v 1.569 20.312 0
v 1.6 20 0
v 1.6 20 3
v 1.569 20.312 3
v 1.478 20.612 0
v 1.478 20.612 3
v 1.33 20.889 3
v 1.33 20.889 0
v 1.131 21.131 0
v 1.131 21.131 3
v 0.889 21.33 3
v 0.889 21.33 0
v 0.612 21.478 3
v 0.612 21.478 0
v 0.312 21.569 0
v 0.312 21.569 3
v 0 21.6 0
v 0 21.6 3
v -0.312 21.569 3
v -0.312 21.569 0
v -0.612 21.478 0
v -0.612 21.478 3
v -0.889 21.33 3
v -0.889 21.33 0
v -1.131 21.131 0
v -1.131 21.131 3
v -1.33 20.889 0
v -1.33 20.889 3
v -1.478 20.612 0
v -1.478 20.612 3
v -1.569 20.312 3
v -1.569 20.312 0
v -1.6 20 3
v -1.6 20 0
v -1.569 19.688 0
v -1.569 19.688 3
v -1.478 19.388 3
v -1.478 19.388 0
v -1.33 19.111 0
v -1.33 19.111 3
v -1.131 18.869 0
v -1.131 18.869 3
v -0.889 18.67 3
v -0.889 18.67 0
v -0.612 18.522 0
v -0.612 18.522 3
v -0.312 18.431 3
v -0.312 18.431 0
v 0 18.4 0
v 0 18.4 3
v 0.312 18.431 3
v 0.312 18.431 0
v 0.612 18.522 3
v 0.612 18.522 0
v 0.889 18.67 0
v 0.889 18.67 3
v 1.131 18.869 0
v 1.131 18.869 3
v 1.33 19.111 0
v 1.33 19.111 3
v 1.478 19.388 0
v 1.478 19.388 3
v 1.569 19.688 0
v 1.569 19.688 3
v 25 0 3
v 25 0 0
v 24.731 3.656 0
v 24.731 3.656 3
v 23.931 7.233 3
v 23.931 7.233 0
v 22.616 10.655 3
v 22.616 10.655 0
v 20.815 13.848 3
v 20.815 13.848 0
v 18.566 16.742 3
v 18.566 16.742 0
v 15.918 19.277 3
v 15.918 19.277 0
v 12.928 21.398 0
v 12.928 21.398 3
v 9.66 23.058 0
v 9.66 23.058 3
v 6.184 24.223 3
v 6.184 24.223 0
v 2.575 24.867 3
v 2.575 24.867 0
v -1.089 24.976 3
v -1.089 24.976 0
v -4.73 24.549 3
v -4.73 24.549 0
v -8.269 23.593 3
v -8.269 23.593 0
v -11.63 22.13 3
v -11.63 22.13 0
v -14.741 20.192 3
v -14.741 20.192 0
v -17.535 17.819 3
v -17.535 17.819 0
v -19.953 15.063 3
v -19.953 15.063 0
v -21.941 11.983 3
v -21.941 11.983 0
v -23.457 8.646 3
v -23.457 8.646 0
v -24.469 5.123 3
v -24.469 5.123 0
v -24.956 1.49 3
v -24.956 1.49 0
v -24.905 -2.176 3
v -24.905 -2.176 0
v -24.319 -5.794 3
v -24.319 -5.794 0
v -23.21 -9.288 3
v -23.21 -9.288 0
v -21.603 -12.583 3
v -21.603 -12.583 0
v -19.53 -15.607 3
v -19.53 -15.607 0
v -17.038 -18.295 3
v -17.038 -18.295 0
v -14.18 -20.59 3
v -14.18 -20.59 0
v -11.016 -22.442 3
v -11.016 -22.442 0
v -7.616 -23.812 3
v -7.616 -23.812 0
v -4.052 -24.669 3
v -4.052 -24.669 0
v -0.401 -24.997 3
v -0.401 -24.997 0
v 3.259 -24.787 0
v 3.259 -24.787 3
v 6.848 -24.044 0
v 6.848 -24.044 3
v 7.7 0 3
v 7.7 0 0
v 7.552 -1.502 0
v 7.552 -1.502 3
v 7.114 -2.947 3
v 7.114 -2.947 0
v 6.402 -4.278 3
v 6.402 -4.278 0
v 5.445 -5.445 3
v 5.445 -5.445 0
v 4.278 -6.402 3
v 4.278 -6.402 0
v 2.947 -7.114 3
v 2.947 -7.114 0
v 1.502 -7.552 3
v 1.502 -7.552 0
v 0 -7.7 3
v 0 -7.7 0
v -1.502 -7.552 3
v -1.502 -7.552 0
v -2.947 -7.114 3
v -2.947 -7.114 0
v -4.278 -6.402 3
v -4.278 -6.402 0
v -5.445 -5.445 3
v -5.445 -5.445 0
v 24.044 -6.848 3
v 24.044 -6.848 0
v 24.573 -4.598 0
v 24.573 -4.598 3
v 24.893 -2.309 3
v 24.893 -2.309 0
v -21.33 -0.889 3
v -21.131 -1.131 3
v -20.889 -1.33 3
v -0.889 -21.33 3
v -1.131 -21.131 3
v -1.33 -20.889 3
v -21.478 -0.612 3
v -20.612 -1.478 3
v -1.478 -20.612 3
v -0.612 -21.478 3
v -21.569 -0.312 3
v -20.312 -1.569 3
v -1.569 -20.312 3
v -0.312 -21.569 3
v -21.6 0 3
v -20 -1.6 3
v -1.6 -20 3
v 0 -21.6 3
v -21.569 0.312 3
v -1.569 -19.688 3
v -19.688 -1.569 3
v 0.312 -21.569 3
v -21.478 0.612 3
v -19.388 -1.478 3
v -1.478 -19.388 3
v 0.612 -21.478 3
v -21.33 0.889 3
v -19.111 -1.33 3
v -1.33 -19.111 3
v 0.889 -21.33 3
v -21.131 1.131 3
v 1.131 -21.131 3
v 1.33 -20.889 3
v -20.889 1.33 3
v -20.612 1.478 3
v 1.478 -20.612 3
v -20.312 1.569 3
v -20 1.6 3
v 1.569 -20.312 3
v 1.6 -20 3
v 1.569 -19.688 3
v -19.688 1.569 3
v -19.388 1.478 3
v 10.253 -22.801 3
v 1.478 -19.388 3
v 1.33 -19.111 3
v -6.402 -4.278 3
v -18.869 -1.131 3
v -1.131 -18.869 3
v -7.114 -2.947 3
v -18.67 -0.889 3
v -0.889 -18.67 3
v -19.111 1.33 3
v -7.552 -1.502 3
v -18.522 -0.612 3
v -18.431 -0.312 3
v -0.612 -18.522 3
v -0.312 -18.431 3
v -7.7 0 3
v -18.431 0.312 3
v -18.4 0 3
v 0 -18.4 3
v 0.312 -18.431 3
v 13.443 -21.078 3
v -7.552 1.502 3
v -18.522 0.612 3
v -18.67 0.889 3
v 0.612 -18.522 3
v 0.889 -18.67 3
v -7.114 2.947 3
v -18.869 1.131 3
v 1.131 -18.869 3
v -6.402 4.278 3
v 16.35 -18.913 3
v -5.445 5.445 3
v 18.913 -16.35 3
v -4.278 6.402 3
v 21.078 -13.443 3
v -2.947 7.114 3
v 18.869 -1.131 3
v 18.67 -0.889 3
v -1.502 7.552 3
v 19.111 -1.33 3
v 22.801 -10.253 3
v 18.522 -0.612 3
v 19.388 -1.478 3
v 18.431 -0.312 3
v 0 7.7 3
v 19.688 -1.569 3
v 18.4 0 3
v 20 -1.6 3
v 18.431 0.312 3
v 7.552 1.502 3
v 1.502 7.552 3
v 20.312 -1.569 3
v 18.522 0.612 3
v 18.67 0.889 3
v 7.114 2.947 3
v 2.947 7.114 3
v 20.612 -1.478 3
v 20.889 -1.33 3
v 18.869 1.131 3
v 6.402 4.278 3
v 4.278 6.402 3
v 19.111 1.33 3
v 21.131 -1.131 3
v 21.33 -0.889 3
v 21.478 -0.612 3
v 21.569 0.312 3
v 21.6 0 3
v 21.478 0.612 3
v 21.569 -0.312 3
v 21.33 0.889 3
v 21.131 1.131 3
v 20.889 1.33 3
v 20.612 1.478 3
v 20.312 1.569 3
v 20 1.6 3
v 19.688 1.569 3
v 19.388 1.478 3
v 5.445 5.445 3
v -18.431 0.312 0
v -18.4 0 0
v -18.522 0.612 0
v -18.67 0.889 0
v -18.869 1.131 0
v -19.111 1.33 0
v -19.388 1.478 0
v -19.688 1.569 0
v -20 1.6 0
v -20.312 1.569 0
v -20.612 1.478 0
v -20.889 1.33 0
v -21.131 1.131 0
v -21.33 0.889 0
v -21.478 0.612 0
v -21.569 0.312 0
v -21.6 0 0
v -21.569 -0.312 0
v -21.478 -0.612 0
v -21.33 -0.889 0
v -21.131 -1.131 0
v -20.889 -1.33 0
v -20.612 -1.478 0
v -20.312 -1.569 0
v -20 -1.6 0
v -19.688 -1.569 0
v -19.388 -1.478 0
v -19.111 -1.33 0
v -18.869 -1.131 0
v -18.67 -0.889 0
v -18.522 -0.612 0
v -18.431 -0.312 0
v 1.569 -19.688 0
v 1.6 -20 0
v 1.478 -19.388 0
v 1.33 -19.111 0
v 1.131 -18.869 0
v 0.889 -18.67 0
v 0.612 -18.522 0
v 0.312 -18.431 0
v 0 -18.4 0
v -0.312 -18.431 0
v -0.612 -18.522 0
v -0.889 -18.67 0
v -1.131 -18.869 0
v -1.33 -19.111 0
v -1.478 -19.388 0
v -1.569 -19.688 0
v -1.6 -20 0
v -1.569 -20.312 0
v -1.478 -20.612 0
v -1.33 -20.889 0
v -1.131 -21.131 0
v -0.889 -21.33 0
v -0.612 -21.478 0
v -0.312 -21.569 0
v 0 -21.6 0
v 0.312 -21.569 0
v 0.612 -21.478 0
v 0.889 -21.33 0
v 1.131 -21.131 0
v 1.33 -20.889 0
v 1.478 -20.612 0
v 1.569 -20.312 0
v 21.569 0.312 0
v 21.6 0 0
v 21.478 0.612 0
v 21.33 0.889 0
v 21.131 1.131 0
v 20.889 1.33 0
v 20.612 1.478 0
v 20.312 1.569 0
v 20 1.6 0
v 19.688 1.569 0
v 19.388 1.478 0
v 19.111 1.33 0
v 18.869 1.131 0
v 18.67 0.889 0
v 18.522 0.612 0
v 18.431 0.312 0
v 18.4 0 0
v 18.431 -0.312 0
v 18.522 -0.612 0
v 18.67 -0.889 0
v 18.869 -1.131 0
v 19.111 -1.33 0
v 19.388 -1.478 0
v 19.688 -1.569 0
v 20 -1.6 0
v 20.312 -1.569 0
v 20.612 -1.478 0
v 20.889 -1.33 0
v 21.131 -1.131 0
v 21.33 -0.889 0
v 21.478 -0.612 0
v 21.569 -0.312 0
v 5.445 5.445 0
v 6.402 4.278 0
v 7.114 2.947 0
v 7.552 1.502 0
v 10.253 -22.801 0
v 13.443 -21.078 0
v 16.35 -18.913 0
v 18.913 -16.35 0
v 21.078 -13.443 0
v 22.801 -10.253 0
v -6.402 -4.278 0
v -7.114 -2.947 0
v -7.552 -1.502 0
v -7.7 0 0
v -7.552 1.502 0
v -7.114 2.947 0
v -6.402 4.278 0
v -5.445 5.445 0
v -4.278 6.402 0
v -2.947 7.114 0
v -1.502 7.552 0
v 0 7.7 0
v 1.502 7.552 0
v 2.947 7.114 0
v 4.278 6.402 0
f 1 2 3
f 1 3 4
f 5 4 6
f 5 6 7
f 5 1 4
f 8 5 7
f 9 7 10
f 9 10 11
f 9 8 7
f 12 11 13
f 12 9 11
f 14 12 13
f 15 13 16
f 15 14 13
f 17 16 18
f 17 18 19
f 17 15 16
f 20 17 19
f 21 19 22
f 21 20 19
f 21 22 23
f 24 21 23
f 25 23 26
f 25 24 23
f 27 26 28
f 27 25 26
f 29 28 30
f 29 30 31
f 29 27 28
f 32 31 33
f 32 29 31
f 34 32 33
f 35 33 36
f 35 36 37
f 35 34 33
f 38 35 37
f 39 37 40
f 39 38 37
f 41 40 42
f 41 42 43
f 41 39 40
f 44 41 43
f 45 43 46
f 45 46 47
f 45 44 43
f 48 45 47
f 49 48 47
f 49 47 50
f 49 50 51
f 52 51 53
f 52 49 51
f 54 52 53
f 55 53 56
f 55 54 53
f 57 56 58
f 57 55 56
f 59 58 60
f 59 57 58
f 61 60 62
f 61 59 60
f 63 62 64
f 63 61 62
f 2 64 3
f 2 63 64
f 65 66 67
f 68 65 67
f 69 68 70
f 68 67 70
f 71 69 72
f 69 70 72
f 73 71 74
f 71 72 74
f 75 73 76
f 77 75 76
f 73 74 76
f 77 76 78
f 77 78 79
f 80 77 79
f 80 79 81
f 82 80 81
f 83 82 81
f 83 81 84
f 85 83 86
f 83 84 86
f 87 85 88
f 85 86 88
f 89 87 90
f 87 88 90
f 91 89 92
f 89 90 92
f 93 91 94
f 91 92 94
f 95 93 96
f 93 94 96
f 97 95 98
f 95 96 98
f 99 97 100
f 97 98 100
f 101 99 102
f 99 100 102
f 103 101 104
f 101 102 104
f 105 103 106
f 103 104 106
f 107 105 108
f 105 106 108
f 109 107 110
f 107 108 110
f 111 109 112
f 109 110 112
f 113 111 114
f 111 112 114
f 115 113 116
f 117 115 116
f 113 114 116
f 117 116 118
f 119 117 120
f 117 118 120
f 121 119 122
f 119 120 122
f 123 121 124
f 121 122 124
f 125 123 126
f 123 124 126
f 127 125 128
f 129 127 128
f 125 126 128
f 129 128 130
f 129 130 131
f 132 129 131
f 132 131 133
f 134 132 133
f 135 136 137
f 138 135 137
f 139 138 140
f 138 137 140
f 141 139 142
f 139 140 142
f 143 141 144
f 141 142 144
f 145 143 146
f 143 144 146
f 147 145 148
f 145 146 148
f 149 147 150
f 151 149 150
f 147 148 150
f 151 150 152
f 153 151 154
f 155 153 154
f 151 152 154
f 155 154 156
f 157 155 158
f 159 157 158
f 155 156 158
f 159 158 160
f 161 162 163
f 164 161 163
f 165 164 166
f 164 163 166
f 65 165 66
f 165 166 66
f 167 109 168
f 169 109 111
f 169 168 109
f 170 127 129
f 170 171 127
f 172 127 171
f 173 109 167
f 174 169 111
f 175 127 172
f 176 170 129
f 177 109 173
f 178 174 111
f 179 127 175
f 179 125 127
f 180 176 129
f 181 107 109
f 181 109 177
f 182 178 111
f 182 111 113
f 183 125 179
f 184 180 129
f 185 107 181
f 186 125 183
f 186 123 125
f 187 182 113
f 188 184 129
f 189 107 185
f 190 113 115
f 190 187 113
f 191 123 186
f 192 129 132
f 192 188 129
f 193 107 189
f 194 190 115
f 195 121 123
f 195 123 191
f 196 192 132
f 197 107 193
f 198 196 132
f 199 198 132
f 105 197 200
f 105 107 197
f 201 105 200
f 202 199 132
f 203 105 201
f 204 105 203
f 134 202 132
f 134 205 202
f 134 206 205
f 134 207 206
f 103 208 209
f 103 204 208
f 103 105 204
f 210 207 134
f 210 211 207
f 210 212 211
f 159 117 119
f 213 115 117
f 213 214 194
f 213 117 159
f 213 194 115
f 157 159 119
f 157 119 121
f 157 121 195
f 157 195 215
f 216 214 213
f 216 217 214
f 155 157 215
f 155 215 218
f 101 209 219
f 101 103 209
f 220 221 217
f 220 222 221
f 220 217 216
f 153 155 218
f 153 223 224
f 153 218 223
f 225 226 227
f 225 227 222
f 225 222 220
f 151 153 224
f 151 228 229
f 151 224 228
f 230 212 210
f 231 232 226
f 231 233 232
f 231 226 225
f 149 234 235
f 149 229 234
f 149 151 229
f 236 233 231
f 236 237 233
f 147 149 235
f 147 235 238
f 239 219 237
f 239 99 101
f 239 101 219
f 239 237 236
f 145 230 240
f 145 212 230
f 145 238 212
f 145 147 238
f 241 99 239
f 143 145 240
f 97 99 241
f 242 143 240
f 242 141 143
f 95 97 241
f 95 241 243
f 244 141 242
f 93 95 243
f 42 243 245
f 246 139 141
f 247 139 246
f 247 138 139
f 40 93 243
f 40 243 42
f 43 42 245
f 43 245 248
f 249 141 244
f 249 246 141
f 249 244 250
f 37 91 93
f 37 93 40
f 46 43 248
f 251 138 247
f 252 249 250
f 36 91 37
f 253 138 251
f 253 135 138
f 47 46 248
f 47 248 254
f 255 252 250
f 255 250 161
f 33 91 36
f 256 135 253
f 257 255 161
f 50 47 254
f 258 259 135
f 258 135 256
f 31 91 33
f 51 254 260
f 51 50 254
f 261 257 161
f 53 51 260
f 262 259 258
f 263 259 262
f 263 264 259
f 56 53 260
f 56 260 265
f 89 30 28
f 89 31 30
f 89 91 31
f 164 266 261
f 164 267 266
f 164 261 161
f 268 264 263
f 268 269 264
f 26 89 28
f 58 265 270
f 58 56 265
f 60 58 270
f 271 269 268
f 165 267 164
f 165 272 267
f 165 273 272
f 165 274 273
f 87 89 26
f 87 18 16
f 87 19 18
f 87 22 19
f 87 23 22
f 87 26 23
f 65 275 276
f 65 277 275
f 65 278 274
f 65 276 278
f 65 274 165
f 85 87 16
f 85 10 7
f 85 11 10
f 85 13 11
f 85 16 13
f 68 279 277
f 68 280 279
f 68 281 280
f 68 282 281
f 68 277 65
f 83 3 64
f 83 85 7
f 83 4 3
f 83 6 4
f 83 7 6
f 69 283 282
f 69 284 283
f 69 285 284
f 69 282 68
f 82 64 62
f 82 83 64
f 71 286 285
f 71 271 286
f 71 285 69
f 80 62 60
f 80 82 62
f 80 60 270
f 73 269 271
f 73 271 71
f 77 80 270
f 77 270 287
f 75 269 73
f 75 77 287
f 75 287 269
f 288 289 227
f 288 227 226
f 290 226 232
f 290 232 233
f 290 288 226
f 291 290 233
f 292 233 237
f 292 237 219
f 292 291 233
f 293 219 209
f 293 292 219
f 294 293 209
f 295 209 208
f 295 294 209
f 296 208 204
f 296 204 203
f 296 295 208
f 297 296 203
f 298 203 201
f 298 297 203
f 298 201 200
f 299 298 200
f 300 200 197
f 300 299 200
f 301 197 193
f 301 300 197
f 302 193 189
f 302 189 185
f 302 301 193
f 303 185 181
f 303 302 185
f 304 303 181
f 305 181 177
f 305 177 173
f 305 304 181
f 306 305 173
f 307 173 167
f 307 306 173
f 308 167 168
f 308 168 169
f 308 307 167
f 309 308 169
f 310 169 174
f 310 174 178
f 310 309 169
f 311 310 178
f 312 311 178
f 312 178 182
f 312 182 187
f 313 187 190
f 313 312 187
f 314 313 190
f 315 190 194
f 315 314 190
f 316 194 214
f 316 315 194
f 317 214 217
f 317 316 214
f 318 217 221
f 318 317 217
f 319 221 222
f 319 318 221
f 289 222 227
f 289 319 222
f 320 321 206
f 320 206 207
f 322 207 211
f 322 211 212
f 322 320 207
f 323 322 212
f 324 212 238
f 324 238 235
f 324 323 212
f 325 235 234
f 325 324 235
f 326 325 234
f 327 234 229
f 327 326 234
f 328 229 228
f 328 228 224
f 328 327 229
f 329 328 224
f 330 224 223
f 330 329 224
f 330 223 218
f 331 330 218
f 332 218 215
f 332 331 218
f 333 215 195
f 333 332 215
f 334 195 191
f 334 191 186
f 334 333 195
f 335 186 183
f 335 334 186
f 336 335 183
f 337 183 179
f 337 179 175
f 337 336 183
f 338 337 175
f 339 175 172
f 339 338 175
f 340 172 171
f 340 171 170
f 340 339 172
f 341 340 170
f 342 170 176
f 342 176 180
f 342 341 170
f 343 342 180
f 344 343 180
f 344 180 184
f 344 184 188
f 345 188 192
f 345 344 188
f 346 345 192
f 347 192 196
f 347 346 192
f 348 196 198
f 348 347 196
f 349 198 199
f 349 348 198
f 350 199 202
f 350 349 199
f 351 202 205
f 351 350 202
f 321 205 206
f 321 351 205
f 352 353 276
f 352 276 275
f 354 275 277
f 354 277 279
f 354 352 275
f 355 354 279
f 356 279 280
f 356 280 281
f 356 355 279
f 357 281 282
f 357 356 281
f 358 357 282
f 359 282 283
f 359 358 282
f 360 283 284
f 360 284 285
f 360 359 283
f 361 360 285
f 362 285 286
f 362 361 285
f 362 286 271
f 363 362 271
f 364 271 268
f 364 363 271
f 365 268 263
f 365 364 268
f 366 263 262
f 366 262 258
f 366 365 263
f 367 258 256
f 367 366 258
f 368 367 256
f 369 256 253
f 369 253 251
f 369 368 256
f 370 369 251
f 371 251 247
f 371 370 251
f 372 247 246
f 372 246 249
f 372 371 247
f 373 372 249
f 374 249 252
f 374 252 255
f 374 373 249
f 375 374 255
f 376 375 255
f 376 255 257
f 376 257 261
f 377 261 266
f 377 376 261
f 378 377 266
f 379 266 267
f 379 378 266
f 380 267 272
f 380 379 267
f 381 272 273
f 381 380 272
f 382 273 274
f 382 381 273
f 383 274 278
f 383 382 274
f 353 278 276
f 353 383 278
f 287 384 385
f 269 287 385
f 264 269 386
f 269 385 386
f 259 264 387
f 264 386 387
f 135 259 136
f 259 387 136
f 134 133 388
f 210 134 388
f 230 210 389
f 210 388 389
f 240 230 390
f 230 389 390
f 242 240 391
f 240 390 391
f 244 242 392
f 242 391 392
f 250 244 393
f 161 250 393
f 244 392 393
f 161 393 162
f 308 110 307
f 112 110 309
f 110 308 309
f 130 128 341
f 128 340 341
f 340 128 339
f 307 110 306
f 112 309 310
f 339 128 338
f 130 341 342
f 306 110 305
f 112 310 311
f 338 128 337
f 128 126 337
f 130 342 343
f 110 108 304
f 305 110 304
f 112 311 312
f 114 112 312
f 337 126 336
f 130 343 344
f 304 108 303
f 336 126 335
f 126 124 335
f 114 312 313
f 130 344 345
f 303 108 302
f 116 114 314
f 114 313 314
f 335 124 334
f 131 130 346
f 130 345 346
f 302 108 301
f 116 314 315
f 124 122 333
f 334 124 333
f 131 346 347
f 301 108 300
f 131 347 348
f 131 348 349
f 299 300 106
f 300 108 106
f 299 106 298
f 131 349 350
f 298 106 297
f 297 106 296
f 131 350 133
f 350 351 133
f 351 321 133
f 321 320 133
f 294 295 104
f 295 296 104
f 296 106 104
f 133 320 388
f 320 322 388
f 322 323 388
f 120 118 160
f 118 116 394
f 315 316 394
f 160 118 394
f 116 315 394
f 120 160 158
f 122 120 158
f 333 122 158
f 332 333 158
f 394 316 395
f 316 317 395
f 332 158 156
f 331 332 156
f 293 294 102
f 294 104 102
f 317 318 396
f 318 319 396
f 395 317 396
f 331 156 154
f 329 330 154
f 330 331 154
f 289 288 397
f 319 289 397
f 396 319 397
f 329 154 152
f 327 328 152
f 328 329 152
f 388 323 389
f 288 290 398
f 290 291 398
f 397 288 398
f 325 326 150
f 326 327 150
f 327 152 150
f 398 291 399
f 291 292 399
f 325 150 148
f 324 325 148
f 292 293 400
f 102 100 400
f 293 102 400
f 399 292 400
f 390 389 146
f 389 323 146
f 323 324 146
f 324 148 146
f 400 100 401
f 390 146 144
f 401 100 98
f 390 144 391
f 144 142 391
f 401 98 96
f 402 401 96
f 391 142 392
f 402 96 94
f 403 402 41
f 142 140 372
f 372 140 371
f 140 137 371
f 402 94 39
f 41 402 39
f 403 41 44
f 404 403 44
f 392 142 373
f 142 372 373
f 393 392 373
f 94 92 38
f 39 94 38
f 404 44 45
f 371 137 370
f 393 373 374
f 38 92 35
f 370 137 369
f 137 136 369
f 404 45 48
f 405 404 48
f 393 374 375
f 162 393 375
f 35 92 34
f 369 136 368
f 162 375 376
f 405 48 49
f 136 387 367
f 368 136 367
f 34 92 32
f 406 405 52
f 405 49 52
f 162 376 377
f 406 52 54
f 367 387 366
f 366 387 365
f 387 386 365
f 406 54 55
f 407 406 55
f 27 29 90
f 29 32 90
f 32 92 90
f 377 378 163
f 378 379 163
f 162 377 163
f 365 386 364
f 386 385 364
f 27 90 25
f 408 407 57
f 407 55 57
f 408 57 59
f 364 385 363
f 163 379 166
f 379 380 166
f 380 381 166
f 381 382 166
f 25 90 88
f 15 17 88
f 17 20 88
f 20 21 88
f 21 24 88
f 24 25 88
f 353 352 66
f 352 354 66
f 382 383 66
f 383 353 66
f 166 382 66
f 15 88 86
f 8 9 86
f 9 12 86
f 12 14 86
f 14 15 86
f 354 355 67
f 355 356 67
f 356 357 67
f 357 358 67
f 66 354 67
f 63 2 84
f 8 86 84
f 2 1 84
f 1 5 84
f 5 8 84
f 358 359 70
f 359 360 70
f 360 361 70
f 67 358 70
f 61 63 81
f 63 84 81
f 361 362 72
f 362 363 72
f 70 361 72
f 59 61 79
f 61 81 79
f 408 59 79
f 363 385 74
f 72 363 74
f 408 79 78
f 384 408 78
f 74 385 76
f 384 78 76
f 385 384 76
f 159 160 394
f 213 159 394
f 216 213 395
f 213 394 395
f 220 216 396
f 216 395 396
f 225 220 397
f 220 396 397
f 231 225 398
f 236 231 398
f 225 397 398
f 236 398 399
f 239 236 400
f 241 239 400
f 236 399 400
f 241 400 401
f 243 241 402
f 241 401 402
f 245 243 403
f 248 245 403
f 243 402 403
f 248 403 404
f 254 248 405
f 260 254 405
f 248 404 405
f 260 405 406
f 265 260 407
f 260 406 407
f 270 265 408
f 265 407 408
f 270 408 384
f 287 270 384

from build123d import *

# Parameters (mm, degrees)
F0_R     = 1.6
F1_DEPTH = 3


with BuildPart() as f1:
    # F0 (on Top) → F1 (new body)
    with BuildSketch(Plane.XY):
        with BuildLine():
            ThreePointArc((19.037183, -8.147739), (21.912225, -8.930193), (24.043754, -6.848203))
            ThreePointArc((24.043754, -6.848203), (24.759784, -3.457322), (25, 0))
            ThreePointArc((25, 0), (-19.952507, 15.063116), (6.848203, -24.043754))
            ThreePointArc((6.848203, -24.043754), (8.930193, -21.912225), (8.147739, -19.037183))
            Line((8.147739, -19.037183), (-5.444722, -5.444722))
            ThreePointArc((-5.444722, -5.444722), (-5.444722, 5.444722), (5.444722, 5.444722))
            Line((5.444722, 5.444722), (19.037183, -8.147739))
        make_face()
        with Locations((0, -20)):
            Circle(F0_R, mode=Mode.SUBTRACT)
        with Locations((-20, 0)):
            Circle(F0_R, mode=Mode.SUBTRACT)
        with Locations((20, 0)):
            Circle(F0_R, mode=Mode.SUBTRACT)
        with Locations((0, 20)):
            Circle(F0_R, mode=Mode.SUBTRACT)
        with BuildLine():
            ThreePointArc((6.848203, -24.043754), (17.67767, -17.67767), (24.043754, -6.848203))
            ThreePointArc((24.043754, -6.848203), (21.912225, -8.930193), (19.037183, -8.147739))
            Line((19.037183, -8.147739), (5.444722, 5.444722))
            ThreePointArc((5.444722, 5.444722), (7.113872, 2.946662), (7.7, 0))
            ThreePointArc((7.7, 0), (2.946662, -7.113872), (-5.444722, -5.444722))
            Line((-5.444722, -5.444722), (8.147739, -19.037183))
            ThreePointArc((8.147739, -19.037183), (8.930193, -21.912225), (6.848203, -24.043754))
        make_face()
    extrude(amount=F1_DEPTH)


solid = f1.part
